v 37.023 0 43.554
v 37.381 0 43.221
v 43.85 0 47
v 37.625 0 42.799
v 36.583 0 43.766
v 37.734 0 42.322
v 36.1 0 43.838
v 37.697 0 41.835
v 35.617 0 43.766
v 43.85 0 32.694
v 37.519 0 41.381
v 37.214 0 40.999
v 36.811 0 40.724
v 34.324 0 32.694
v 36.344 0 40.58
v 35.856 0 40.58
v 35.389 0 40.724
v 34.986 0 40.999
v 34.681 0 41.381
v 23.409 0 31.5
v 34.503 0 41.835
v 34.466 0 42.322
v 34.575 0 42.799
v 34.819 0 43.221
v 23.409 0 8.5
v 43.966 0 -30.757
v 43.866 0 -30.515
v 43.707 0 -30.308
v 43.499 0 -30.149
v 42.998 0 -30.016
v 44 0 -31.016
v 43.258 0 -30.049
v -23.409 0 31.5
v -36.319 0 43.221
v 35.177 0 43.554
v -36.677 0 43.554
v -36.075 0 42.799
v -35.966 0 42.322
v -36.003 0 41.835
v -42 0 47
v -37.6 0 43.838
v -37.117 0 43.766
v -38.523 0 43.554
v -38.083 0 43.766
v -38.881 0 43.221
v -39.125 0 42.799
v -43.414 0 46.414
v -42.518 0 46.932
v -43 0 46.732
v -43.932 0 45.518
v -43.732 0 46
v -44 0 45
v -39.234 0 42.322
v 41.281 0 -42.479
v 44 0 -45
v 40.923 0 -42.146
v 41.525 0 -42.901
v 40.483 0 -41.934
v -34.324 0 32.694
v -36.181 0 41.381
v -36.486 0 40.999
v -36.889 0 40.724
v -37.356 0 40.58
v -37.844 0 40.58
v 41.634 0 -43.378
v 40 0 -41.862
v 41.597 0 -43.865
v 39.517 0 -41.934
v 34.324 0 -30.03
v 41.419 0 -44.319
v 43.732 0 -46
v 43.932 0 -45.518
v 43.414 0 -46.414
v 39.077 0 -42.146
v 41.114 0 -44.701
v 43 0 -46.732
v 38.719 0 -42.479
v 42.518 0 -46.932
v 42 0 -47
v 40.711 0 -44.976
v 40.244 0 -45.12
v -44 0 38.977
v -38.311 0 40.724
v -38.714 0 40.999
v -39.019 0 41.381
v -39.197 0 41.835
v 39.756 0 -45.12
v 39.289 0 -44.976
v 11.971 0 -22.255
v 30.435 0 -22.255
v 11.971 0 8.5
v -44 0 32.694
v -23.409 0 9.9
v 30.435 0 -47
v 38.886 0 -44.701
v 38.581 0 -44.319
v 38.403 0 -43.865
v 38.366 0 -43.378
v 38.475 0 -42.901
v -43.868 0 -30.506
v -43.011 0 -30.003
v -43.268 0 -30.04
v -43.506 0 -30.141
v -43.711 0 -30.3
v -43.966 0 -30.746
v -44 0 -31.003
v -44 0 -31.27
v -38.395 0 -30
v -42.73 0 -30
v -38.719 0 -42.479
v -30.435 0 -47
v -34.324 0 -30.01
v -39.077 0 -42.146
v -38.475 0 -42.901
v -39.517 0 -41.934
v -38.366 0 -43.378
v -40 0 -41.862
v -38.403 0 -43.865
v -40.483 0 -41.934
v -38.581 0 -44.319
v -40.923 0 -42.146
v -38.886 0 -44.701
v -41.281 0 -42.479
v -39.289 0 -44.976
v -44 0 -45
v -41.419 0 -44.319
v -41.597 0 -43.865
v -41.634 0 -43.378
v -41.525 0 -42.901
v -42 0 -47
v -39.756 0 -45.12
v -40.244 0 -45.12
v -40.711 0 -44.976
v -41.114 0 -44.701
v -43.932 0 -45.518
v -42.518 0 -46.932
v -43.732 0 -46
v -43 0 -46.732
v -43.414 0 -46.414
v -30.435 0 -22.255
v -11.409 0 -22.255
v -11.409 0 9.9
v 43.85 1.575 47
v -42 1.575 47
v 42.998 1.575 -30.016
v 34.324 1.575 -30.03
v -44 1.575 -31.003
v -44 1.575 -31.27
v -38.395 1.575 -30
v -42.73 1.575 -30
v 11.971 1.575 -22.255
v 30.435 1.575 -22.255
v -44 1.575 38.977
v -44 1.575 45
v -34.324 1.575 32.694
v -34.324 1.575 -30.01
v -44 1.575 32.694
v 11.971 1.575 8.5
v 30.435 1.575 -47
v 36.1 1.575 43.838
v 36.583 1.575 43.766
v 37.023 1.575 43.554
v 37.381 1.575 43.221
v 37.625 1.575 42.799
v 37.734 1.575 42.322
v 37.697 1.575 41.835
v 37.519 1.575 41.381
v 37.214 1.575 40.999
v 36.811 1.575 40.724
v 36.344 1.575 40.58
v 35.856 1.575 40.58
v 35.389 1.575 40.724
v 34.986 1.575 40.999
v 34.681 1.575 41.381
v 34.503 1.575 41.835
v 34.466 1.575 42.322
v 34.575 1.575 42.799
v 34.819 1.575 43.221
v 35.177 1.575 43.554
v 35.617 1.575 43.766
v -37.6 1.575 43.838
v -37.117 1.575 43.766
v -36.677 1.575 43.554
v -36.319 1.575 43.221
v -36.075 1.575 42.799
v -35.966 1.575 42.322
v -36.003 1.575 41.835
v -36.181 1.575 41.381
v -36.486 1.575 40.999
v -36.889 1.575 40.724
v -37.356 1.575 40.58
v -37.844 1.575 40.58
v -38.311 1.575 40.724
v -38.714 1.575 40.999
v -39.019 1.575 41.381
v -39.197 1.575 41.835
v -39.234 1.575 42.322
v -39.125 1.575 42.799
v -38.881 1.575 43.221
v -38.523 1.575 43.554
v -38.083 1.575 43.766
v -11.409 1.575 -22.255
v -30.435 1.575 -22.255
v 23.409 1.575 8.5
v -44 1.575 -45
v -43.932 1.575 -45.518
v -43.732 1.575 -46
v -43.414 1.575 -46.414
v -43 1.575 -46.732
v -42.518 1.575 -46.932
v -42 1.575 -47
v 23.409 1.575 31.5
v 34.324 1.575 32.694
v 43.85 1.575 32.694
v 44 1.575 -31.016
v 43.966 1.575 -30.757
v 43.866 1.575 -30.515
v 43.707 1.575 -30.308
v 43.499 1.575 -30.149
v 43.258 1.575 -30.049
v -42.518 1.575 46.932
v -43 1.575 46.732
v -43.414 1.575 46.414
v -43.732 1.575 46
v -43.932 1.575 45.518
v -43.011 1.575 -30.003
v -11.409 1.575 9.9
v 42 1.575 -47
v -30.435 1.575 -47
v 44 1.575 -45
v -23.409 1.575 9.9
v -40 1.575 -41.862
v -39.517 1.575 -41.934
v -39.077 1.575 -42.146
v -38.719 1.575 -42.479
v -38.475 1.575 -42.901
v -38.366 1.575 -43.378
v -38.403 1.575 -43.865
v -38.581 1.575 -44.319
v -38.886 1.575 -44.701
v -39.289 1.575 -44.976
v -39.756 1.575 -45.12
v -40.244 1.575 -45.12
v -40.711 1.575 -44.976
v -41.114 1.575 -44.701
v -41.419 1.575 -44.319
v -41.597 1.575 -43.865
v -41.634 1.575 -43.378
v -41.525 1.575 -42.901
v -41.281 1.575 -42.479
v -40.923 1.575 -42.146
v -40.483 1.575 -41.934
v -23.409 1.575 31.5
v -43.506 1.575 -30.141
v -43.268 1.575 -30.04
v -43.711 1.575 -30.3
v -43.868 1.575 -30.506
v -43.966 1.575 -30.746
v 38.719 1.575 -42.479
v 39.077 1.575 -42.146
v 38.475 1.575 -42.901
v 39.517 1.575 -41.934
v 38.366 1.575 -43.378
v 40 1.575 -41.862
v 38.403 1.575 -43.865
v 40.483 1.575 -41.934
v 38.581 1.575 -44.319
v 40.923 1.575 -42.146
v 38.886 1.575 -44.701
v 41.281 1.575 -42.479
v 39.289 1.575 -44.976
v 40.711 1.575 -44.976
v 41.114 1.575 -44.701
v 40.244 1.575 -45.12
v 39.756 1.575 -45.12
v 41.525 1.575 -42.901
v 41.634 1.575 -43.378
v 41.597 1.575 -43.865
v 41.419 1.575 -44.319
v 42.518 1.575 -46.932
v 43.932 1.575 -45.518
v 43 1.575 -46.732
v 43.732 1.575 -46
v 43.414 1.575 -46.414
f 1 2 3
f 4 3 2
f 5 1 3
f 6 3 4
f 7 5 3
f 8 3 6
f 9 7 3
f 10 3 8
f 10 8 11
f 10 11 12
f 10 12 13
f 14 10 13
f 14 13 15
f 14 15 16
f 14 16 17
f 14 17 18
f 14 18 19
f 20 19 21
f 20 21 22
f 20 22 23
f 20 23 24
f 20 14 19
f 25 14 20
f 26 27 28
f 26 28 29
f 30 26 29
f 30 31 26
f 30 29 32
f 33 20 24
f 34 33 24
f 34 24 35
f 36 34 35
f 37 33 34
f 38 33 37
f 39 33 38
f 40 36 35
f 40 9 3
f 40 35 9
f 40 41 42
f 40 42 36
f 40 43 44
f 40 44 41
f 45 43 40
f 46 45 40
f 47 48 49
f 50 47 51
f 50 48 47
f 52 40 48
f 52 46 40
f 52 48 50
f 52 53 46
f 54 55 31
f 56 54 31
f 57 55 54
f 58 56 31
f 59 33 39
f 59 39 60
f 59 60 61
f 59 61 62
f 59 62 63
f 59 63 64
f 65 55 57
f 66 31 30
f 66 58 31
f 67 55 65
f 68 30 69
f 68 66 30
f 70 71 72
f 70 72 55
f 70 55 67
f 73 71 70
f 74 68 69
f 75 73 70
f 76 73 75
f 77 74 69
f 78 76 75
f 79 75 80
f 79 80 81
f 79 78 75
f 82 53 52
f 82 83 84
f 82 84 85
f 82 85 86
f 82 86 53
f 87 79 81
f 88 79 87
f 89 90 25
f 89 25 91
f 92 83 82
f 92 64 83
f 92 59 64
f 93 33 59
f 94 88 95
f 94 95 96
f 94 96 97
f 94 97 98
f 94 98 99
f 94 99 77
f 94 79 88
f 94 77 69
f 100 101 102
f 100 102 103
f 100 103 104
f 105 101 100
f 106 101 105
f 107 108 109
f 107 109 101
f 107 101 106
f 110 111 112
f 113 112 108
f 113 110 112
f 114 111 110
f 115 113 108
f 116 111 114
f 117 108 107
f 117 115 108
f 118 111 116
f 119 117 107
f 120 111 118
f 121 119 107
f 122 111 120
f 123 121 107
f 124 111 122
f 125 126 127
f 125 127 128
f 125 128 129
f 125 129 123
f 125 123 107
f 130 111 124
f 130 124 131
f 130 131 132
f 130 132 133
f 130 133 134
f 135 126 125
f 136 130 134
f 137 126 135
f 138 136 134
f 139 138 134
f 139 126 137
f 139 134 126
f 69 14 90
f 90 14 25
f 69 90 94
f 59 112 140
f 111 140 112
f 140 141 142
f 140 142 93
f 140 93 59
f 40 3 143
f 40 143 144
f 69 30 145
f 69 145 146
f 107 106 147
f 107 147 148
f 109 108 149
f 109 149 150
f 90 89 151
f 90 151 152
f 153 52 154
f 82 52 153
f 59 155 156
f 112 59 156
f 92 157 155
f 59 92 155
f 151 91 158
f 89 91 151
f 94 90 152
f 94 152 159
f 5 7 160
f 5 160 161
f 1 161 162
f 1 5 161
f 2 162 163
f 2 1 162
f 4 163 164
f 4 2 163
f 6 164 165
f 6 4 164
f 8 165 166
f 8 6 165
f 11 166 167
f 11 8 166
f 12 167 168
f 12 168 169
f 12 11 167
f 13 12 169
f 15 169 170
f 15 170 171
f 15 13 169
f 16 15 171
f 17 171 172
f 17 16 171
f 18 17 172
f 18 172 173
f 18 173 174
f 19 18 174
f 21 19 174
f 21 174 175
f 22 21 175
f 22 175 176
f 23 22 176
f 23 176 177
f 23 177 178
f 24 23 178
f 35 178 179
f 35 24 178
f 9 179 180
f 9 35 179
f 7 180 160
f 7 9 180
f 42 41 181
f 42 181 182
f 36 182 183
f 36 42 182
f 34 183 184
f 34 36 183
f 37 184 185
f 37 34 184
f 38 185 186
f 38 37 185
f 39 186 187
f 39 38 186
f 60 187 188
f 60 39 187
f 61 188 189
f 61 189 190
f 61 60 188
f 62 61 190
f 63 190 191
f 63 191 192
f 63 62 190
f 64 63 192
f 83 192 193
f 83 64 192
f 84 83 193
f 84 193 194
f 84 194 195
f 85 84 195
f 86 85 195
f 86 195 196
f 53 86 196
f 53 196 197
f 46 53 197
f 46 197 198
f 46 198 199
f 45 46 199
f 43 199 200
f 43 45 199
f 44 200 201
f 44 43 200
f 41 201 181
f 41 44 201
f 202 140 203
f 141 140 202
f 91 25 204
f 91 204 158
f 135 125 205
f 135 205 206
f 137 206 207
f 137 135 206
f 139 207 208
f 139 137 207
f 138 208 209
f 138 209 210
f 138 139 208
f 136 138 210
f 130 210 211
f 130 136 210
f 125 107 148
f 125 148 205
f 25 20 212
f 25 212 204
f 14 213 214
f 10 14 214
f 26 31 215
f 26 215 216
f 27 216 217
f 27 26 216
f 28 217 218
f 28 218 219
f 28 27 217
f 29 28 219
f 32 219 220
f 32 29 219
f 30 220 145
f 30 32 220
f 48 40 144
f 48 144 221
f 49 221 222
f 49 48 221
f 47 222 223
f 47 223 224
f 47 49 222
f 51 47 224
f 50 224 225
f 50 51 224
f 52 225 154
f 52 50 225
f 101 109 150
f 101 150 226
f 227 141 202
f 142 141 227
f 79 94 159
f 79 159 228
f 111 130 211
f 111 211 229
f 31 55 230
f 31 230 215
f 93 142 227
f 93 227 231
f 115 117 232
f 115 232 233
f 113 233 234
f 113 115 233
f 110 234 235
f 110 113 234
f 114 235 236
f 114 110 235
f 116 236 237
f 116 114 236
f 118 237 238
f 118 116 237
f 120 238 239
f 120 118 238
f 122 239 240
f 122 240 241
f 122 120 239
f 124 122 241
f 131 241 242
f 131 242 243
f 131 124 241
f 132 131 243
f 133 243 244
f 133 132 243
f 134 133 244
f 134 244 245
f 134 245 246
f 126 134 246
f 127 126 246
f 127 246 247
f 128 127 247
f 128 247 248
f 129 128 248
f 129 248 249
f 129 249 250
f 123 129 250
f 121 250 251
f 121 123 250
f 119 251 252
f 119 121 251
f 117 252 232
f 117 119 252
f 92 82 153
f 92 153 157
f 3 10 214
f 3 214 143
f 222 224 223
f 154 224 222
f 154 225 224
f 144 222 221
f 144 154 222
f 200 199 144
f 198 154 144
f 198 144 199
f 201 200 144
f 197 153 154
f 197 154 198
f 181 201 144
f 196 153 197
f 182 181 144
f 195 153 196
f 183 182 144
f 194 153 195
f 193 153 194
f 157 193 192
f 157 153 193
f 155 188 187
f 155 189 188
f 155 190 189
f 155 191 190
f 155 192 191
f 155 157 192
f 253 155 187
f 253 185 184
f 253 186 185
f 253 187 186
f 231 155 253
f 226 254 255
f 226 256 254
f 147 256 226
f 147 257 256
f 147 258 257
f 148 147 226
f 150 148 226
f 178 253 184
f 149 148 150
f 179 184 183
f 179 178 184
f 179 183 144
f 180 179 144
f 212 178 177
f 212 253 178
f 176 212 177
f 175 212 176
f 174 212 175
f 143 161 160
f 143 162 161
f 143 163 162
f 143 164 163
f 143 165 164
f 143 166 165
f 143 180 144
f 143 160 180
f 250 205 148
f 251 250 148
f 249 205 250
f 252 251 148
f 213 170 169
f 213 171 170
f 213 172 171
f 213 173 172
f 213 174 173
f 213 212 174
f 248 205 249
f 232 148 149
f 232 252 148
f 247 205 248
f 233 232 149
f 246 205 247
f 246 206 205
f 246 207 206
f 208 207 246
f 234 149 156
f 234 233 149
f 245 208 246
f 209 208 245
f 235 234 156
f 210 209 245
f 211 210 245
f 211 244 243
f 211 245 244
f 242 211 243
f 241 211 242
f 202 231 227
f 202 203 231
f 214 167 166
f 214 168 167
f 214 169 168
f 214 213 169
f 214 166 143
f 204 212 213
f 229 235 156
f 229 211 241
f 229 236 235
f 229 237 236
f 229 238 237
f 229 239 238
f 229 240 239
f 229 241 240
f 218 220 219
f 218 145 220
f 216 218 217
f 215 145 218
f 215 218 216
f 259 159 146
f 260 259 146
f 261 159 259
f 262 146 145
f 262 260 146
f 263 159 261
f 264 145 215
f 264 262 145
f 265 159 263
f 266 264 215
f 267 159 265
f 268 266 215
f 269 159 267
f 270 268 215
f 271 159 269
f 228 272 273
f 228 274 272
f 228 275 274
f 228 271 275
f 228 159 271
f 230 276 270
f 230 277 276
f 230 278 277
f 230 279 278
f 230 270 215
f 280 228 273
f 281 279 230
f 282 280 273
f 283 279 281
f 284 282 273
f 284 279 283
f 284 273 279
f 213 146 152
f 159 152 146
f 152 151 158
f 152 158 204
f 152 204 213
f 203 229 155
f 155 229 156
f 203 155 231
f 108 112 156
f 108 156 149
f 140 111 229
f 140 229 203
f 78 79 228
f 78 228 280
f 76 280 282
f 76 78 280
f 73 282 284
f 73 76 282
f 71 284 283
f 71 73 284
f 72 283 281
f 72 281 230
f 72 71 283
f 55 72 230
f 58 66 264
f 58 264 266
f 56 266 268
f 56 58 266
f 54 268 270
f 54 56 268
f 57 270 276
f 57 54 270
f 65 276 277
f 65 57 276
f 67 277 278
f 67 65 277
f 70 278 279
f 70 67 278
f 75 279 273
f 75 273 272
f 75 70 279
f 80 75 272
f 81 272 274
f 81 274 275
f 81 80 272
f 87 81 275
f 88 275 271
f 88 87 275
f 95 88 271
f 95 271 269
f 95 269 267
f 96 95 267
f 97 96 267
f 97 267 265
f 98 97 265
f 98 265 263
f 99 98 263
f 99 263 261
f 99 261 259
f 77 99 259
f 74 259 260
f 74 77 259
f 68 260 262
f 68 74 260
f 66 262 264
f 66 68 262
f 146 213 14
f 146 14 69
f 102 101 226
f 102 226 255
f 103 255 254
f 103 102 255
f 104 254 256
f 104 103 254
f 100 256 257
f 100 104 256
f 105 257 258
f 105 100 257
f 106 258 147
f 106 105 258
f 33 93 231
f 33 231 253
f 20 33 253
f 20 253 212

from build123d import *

# Parameters (mm, degrees)
SKETCH1_2_R                 = 1.6383
BOSS_EXTRUDE2_DEPTH         = 1.575
SKETCH2_W                   = 14.080651801
SKETCH2_H                   = 7.11628052
SKETCH2_W_2                 = 15.007196354
SKETCH2_H_2                 = 9.421332762
CUT_EXTRUDE1_DEPTH          = 65.400942629
ADDITIONAL_PCB_MATERIAL_W   = 2.649520344
ADDITIONAL_PCB_MATERIAL_H   = 65.213315835
ADDITIONAL_PCB_MATERIAL_W_2 = 1.5
ADDITIONAL_PCB_MATERIAL_H_2 = 65.299191064
BOSS_EXTRUDE3_DEPTH         = 1.575


with BuildPart() as part:
    # Sketch1<2> → Boss-Extrude2 (new body)
    with BuildSketch(Plane(origin=(0, 0, 0), x_dir=(1, 0, 0), z_dir=(0, 1, 0))):
        with BuildLine():
            Line((-38.39500299, 29.999999735), (-42.73000299, 29.999999735))
            Line((-42.73000299, 29.999999735), (-43.011025994, 30.003097626))
            ThreePointArc((-43.011025994, 30.003097626), (-43.710996344, 30.299838092), (-44.000003042, 31.003036872))
            Line((-44.000003042, 31.003036872), (-44.000003042, 31.269999735))
            Line((-44.000003042, 31.269999735), (-44.000005679, 44.999999735))
            ThreePointArc((-44.000005679, 44.999999735), (-43.414218633, 46.414215608), (-42.000002924, 47.000003051))
            Line((-42.000002924, 47.000003051), (-30.435003, 47.000003051))
            Line((-30.435003, 47.000003051), (-30.435003, 22.255357341))
            Line((-30.435003, 22.255357341), (-11.409003, 22.255357341))
            Line((-11.409003, 22.255357341), (-11.409003, -9.899999999))
            Line((-11.409003, -9.899999999), (-23.409003, -9.899999999))
            Line((-23.409003, -9.899999999), (-23.409003, -31.499996949))
            Line((-23.409003, -31.499996949), (23.408997, -31.499996949))
            Line((23.408997, -31.499996949), (23.408997, -8.499997555))
            Line((23.408997, -8.499997555), (11.97084713, -8.499997555))
            Line((11.97084713, -8.499997555), (11.97084713, 22.255357341))
            Line((11.97084713, 22.255357341), (30.434997, 22.255357341))
            Line((30.434997, 22.255357341), (30.434997, 47.000003051))
            Line((30.434997, 47.000003051), (42.000008541, 47.000003051))
            ThreePointArc((42.000008541, 47.000003051), (43.414213215, 46.414220704), (43.999996956, 45.000016607))
            Line((43.999996956, 45.000016607), (43.999996956, 32.000003378))
            Line((43.999996956, 32.000003378), (43.999996956, 31.015615364))
            ThreePointArc((43.999996956, 31.015615364), (43.706534093, 30.307939396), (42.998386406, 30.015616661))
            Line((42.998386406, 30.015616661), (33.825607551, 30.030389905))
            ThreePointArc((33.825607551, 30.030389905), (33.117459864, 29.738067169), (32.823997, 29.030391202))
            Line((32.823997, 29.030391202), (32.823997, -30.453996949))
            ThreePointArc((32.823997, -30.453996949), (33.116890219, -31.16110373), (33.823997, -31.453996949))
            Line((33.823997, -31.453996949), (36.099999555, -31.453996949))
            Line((36.099999555, -31.453996949), (42.849728118, -31.453996949))
            ThreePointArc((42.849728118, -31.453996949), (43.556834899, -31.746890168), (43.849728118, -32.453996949))
            Line((43.849728118, -32.453996949), (43.849728118, -36.999996949))
            Line((43.849728118, -36.999996949), (43.849728118, -46.999996949))
            Line((43.849728118, -46.999996949), (-42.000000178, -46.999996949))
            ThreePointArc((-42.000000178, -46.999996949), (-43.414212804, -46.414211581), (-44.000000499, -44.999999921))
            Line((-44.000000499, -44.999999921), (-44.000000178, -38.976999921))
            Line((-44.000000178, -38.976999921), (-44.000000178, -32.453999802))
            ThreePointArc((-44.000000178, -32.453999802), (-43.70710696, -31.746893021), (-43.000000178, -31.453999802))
            Line((-43.000000178, -31.453999802), (-36.100000549, -31.453999802))
            Line((-36.100000549, -31.453999802), (-33.824003042, -31.453999802))
            ThreePointArc((-33.824003042, -31.453999802), (-33.116896261, -31.161106583), (-32.824003042, -30.453999802))
            Line((-32.824003042, -30.453999802), (-32.824003042, 29.011483943))
            ThreePointArc((-32.824003042, 29.011483943), (-33.117785331, 29.719478678), (-33.826516131, 30.011480785))
            Line((-33.826516131, 30.011480785), (-38.39500299, 29.999999735))
        make_face()
        with Locations((40, 43.5)):
            Circle(SKETCH1_2_R, mode=Mode.SUBTRACT)
        with Locations((-40, 43.5)):
            Circle(SKETCH1_2_R, mode=Mode.SUBTRACT)
        with Locations((-37.6, -42.2)):
            Circle(SKETCH1_2_R, mode=Mode.SUBTRACT)
        with Locations((36.1, -42.2)):
            Circle(SKETCH1_2_R, mode=Mode.SUBTRACT)
    extrude(amount=BOSS_EXTRUDE2_DEPTH)

    # Sketch2 → Cut-Extrude1 (cut, through all)
    with BuildSketch(Plane(origin=(0, 1.575, 0), x_dir=(1, 0, 0), z_dir=(0, 1, 0))):
        with Locations((39.863054019, -29.135856689)):
            Rectangle(SKETCH2_W, SKETCH2_H)
        with Locations((-40.336598676, -27.983330568)):
            Rectangle(SKETCH2_W_2, SKETCH2_H_2)
    extrude(amount=-CUT_EXTRUDE1_DEPTH, mode=Mode.SUBTRACT)

    # Additional PCB material → Boss-Extrude3 (add)
    with BuildSketch(Plane(origin=(0, 1.575, 0), x_dir=(1, 0, 0), z_dir=(0, 1, 0))):
        with Locations((32.999236828, -1.128517583)):
            Rectangle(ADDITIONAL_PCB_MATERIAL_W, ADDITIONAL_PCB_MATERIAL_H)
        with Locations((-33.574003042, -1.085579968)):
            Rectangle(ADDITIONAL_PCB_MATERIAL_W_2, ADDITIONAL_PCB_MATERIAL_H_2)
    extrude(amount=-BOSS_EXTRUDE3_DEPTH)


solid = part.part
